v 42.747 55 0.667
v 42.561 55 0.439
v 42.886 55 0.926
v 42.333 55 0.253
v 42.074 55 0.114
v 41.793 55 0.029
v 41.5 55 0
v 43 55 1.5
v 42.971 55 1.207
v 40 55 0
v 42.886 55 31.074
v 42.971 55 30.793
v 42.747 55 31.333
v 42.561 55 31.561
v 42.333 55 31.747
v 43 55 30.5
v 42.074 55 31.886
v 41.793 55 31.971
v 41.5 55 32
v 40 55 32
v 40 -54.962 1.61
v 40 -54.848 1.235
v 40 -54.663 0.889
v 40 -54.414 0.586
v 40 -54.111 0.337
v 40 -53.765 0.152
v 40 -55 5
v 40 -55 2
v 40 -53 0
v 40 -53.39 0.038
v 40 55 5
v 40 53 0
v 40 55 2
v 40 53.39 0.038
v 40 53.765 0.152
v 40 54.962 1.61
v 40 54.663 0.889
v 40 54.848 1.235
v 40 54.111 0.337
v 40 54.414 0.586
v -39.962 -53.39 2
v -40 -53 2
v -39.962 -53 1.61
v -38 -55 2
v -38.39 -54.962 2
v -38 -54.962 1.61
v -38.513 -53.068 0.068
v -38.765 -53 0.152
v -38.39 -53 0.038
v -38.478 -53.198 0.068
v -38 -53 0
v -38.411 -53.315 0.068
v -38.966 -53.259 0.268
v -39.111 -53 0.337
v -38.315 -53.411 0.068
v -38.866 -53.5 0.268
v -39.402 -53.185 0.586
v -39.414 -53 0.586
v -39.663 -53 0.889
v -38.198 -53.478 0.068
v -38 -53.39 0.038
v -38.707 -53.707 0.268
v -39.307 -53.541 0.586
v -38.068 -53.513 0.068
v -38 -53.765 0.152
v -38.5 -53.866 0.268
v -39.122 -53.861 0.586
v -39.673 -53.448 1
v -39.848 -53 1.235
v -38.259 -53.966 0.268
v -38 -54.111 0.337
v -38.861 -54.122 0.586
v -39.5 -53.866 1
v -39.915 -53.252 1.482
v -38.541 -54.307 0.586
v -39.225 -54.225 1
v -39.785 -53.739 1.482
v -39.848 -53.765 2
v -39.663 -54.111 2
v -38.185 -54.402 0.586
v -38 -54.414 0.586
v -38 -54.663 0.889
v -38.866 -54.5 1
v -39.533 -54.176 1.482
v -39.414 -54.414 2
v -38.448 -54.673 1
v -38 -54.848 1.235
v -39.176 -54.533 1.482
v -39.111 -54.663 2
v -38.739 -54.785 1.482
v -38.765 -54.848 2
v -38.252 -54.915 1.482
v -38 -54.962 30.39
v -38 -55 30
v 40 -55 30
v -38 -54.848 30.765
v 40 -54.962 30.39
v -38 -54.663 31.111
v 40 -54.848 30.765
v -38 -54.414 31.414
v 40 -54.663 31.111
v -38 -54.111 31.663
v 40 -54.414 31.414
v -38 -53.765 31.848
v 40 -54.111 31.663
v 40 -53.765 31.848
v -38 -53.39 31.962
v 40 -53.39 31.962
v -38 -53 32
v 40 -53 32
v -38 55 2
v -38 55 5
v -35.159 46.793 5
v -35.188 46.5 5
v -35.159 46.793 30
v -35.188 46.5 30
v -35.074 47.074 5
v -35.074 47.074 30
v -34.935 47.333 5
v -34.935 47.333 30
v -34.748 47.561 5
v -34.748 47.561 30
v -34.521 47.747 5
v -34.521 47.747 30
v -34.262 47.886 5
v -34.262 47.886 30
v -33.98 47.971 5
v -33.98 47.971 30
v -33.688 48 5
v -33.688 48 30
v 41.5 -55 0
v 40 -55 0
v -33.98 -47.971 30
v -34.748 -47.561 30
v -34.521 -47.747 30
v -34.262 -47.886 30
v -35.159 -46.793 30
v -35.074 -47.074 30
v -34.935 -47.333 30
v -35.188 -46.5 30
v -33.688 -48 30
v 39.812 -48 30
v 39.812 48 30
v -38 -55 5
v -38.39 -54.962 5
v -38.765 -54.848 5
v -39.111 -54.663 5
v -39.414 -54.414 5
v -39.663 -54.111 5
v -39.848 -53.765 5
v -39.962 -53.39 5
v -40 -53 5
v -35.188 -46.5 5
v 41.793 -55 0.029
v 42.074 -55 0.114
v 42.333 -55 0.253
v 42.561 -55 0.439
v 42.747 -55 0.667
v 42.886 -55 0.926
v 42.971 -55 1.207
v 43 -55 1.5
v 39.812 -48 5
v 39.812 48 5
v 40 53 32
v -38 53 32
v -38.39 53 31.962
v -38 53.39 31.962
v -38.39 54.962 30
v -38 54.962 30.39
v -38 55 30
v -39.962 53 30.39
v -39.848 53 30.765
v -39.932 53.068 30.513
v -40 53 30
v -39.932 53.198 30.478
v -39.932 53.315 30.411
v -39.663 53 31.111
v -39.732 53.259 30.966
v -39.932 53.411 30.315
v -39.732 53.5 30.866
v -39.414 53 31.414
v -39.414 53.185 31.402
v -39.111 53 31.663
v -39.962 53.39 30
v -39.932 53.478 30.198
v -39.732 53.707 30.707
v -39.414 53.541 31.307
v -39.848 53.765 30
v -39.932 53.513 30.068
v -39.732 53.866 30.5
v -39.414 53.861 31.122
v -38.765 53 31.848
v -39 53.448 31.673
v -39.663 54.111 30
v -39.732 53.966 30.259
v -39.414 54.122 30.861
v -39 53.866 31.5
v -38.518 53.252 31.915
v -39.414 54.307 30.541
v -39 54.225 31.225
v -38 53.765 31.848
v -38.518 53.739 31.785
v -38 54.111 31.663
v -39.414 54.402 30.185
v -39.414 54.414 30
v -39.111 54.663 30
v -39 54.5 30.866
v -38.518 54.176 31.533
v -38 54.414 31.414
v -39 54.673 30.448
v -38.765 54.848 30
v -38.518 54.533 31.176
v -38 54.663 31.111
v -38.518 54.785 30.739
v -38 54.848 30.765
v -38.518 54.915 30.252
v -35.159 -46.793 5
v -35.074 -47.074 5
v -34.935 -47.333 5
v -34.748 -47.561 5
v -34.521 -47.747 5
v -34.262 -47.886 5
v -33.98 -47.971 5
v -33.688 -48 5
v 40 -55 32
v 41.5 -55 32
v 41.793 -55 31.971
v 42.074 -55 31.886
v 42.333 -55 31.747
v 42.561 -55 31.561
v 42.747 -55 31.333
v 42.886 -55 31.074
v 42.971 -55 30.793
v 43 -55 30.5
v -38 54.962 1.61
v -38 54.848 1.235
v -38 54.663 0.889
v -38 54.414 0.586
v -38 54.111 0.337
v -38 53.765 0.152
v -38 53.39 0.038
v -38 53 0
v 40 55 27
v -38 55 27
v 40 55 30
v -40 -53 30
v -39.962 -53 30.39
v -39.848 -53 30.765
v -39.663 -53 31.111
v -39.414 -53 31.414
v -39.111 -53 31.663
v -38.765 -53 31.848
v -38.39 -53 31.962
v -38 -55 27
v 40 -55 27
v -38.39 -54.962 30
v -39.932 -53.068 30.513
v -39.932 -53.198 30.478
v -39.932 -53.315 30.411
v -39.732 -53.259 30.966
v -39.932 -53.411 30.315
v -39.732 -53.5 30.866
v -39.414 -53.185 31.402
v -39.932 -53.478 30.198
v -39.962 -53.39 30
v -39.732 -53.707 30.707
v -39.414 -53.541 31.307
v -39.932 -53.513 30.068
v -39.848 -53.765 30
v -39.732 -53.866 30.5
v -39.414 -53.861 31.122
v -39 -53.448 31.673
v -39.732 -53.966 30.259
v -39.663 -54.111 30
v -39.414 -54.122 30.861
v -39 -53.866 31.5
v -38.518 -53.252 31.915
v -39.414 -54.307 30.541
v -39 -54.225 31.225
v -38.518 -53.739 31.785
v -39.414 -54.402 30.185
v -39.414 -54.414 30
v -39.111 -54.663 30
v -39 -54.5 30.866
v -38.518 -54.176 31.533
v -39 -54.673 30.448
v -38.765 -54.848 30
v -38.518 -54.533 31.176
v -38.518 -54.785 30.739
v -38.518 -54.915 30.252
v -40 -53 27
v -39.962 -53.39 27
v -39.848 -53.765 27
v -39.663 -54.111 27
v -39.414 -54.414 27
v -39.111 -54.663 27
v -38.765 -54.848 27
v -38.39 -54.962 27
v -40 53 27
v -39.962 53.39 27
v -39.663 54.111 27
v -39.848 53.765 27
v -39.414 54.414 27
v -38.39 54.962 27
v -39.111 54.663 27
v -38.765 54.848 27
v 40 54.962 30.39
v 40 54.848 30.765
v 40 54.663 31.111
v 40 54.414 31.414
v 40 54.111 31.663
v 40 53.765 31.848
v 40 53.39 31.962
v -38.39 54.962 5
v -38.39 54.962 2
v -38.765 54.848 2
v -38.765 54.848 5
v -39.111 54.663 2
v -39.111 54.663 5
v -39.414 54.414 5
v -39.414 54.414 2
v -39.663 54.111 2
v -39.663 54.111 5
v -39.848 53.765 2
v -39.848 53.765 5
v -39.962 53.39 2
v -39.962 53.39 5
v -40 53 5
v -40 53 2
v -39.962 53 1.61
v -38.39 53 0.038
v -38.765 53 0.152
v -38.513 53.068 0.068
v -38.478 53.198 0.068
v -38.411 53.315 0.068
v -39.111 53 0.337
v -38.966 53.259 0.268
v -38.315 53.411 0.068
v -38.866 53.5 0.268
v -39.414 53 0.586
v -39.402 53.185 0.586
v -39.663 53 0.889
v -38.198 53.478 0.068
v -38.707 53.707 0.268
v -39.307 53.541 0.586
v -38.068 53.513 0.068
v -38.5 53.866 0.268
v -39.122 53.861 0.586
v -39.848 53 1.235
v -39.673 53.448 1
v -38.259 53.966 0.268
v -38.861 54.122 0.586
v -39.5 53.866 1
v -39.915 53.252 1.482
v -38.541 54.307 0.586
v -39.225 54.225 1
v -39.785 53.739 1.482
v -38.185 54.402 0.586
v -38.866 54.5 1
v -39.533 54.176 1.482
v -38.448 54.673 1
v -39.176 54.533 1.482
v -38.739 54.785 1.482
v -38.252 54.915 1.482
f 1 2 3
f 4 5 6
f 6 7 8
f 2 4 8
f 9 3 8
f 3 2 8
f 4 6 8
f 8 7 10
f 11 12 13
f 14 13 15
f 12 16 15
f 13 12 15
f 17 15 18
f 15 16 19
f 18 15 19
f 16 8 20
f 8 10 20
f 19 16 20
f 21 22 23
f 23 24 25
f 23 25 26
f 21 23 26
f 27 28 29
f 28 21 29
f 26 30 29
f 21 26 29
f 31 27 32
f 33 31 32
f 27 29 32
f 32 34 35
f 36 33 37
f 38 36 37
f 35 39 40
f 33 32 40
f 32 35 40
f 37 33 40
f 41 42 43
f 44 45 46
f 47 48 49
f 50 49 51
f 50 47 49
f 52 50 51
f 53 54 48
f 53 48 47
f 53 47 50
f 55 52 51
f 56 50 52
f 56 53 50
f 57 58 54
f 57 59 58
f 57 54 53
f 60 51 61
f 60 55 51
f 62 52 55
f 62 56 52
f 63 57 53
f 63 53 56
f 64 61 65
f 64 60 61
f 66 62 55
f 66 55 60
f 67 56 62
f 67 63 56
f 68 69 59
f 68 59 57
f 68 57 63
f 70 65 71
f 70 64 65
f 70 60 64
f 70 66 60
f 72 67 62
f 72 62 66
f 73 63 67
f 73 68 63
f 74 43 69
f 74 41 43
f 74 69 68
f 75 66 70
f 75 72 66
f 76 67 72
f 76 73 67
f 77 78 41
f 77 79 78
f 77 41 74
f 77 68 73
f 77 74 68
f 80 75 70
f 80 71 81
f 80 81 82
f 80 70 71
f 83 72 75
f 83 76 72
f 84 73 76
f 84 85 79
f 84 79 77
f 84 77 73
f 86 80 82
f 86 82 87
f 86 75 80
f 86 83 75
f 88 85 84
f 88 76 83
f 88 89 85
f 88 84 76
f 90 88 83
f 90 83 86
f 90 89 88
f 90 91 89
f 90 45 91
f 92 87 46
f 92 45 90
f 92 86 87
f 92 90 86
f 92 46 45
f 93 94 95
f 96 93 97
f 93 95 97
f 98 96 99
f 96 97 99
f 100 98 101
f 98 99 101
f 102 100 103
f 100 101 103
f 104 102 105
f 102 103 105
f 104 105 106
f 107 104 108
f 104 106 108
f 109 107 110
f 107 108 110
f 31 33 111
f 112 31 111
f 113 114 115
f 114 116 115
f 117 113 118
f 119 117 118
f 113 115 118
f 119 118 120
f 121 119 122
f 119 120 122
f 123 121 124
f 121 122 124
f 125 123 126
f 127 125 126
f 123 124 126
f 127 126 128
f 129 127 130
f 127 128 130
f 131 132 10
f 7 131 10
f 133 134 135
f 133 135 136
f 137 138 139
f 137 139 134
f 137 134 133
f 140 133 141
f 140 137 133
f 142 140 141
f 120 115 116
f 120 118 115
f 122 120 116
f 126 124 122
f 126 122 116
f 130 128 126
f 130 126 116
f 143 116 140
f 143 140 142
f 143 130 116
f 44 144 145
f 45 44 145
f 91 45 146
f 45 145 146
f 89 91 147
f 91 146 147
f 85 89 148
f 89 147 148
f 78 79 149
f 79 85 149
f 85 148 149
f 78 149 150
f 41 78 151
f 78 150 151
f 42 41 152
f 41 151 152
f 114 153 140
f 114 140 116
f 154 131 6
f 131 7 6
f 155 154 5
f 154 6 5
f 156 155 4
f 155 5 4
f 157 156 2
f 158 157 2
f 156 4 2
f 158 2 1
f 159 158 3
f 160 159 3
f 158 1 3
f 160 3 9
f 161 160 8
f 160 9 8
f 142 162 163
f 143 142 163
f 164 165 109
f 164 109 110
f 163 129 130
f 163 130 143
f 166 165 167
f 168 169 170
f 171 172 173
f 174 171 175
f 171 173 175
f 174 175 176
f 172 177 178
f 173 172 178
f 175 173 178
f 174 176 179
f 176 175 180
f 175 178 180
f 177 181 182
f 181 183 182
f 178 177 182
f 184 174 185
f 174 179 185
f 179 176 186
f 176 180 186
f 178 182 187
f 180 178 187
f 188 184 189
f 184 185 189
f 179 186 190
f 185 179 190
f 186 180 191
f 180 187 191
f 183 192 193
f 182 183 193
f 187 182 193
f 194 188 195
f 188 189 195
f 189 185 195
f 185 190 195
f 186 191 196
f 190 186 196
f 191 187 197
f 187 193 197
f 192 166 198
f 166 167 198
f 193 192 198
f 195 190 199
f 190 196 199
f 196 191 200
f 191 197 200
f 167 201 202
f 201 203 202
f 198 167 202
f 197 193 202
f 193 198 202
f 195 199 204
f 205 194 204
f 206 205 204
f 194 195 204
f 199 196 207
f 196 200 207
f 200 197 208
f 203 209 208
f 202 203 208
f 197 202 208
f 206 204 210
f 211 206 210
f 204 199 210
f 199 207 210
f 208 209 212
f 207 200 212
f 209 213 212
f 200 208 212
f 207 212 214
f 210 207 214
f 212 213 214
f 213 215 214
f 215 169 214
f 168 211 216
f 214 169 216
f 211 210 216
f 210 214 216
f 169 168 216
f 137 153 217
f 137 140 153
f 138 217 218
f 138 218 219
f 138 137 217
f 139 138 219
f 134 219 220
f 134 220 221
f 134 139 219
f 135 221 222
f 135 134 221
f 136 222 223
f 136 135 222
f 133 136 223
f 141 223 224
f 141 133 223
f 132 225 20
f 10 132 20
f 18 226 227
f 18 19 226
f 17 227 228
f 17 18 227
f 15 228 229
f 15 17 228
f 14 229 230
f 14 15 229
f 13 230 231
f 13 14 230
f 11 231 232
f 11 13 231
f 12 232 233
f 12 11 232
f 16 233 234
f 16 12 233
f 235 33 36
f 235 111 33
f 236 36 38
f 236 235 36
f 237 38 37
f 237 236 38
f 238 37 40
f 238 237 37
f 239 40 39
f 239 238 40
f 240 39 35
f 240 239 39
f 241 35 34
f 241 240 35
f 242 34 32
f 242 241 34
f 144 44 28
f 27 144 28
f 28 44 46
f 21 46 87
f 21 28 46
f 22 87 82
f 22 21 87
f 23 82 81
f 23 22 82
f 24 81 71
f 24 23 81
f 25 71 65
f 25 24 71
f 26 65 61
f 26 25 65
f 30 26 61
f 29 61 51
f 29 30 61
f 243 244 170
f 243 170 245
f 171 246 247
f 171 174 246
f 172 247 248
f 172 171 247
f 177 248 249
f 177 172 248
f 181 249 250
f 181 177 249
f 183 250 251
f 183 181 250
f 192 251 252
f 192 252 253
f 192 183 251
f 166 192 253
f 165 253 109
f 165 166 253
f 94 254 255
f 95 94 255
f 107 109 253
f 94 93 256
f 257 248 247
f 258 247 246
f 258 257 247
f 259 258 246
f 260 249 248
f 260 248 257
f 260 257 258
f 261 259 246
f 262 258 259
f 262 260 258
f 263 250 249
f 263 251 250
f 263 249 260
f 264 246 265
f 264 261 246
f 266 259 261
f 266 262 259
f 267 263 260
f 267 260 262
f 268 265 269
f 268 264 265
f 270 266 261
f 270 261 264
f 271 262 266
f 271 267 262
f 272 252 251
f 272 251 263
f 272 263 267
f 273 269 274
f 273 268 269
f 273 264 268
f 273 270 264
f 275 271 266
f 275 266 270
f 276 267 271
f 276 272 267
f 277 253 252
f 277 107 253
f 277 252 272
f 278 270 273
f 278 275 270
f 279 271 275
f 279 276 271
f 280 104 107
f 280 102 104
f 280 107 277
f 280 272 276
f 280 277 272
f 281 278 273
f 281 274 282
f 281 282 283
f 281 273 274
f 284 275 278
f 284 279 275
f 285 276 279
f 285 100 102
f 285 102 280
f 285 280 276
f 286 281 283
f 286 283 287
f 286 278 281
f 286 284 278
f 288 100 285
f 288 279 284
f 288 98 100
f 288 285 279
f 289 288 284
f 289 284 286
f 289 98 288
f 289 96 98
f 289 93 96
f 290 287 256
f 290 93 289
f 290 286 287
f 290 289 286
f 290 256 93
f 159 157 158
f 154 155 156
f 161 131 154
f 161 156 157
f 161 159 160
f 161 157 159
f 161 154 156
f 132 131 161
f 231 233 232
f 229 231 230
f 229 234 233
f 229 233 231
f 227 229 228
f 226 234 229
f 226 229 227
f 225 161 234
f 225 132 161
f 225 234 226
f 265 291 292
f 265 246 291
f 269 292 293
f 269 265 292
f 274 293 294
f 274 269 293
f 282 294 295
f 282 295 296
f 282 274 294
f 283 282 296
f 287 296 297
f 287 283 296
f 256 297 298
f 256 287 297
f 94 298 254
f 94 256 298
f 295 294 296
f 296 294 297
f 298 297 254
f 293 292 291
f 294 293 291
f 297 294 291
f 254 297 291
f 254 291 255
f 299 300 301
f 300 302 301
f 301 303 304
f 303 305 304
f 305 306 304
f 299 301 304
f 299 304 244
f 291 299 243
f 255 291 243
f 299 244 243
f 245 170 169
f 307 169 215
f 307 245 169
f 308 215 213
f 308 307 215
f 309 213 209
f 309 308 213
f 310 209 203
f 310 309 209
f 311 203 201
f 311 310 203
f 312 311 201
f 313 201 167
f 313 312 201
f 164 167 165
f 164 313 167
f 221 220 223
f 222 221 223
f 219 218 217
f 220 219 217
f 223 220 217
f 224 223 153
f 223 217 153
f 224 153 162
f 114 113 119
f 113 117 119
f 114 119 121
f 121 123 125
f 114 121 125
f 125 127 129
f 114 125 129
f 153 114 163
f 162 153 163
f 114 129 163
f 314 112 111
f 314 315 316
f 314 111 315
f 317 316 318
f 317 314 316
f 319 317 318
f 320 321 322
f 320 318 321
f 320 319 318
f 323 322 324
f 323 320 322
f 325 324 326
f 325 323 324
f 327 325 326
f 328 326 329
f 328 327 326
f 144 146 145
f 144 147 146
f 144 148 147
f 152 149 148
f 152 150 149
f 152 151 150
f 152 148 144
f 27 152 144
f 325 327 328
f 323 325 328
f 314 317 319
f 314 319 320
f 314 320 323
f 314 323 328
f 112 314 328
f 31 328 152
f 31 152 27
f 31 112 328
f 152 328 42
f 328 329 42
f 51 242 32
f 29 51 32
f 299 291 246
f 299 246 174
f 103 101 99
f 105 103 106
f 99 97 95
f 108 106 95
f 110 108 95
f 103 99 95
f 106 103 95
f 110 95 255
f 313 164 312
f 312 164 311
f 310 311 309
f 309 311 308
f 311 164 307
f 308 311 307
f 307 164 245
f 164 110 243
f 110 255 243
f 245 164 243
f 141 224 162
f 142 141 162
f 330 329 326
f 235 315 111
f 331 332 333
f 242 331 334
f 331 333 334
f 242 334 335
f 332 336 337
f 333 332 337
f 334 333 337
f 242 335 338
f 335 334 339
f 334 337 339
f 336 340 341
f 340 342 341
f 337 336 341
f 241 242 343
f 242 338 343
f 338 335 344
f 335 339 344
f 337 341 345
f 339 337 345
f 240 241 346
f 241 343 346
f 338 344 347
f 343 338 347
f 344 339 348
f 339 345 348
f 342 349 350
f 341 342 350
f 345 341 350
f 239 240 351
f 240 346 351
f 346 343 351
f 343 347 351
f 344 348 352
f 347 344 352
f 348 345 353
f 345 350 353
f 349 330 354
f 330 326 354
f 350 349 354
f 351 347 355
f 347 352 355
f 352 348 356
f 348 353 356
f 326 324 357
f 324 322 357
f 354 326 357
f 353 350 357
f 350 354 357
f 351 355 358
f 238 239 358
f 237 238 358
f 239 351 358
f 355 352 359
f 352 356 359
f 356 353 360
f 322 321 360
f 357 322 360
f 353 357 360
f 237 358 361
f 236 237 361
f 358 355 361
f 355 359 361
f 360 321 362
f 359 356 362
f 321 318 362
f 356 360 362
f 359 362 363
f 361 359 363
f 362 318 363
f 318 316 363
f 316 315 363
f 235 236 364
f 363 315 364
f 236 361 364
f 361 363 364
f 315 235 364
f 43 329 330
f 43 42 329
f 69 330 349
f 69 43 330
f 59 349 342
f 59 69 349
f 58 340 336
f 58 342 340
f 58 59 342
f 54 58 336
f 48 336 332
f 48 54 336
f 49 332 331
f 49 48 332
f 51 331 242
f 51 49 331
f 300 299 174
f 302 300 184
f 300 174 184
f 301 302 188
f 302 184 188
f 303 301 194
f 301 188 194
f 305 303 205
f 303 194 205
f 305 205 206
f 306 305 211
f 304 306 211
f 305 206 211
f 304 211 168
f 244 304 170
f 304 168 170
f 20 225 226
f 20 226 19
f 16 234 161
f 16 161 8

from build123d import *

# Parameters (mm, degrees)
F3_W      = 80
F3_H      = 110
F4_DEPTH  = 5
F6_W      = 110
F6_H      = 32
F7_DEPTH  = 3
F8_R      = 2
F9_R      = 1.5
F11_W     = 75
F11_H     = 96
F12_DEPTH = 25
F13_R     = 1.5


with BuildPart() as f4:
    # F0 (on Top) + F3 (on offset) → F4 (new body)
    with BuildSketch(Plane.XY):
        Polygon((-40, -55), (40, -55), (40, -48), (40, 48), (40, 55), (-40, 55), align=None)
    with BuildSketch(Plane.XY.offset(27)):
        Rectangle(F3_W, F3_H)
    extrude(amount=F4_DEPTH)

    # F8
    f8_edges = [f4.edges().sort_by_distance(p)[0] for p in [
        (0, 55, 32),
        (0, -55, 32),
        (-40, 0, 32),
        (-40, 55, 29.5),
        (-40, -55, 29.5),
        (-40, 55, 2.5),
        (-40, -55, 2.5),
        (-40, 0, 0),
        (0, 55, 0),
        (0, -55, 0),
    ]]
    fillet(f8_edges, radius=F8_R)


with BuildPart() as f7:
    # F6 (on offset) → F7 (new body)
    with BuildSketch(Plane.YZ.offset(40)):
        with Locations((4e-06, 16)):
            Rectangle(F6_W, F6_H)
    extrude(amount=F7_DEPTH)

    # F9
    f9_edges = [f7.edges().sort_by_distance(p)[0] for p in [
        (43, 4e-06, 0),
        (43, 4e-06, 32),
    ]]
    fillet(f9_edges, radius=F9_R)


with BuildPart() as f12:
    # F11 (on offset) → F12 (new body)
    with BuildSketch(Plane.XY.offset(5)):
        with Locations((2.312253, 4e-06)):
            Rectangle(F11_W, F11_H)
    extrude(amount=F12_DEPTH)

    # F13
    f13_edges = [f12.edges().sort_by_distance(p)[0] for p in [
        (-35.187747, 48.000004, 17.5),
        (-35.187747, -47.999996, 17.5),
    ]]
    fillet(f13_edges, radius=F13_R)


solid = Compound([f4.part, f7.part, f12.part])
